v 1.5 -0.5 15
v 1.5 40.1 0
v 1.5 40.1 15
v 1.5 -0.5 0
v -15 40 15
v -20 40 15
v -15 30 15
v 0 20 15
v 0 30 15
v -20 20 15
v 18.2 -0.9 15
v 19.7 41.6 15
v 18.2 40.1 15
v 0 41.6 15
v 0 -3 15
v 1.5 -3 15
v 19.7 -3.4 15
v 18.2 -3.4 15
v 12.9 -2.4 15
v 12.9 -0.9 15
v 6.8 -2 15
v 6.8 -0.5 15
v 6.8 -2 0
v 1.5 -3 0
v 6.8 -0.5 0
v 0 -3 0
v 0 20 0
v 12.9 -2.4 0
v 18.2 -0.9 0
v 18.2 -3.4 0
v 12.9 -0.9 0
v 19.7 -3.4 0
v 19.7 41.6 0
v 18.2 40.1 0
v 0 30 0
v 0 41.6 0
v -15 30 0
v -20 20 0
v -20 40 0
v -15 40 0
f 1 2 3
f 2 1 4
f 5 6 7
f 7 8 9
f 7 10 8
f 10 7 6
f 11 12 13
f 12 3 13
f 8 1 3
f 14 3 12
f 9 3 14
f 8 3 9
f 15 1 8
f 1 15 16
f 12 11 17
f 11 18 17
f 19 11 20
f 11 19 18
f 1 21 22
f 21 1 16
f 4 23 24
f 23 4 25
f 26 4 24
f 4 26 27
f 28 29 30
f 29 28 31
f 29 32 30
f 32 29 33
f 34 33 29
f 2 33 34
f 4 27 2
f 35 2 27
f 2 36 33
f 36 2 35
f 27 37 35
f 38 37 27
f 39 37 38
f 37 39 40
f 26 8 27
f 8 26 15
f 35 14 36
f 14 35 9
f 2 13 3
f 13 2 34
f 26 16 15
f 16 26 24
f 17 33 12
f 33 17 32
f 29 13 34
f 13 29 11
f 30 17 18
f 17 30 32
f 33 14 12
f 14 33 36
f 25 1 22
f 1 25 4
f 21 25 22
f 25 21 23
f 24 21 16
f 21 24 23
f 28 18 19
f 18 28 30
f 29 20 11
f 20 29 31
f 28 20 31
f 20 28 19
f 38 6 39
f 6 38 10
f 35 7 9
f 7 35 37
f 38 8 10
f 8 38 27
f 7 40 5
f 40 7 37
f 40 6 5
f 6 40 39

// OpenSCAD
//CUSTOMIZER VARIABLES
//	Length of the hook
hooklength=20;
// Width of hook and clamp
height=15;
//CUSTOMIZER VARIABLES END

endthickness=5;
thickness=01.5;
doorheight=38.6;
correction_doorheight_inside=0.4;
door_thickness=16.7;
door_undercut=5.3;


module widerhaken(height=height)
{
    linear_extrude(height = height)
    rotate([0,0,0]) polygon(points=[[0,0],[door_undercut,0],[door_undercut,-thickness],[0,-1-thickness]], paths=[[0,1,2,3]],convexity=10);
}


module haken(height=height,hooklength=hooklength)
{translate([0,-2*thickness,0]) cube([thickness,doorheight+3*thickness,height]);
translate([door_thickness+thickness,-2*thickness-correction_doorheight_inside,0]) cube([thickness,doorheight+3*thickness+correction_doorheight_inside,height]);
translate([0,doorheight+thickness,0]) cube([door_thickness+2*thickness,thickness,height]);
    translate([thickness,1-thickness,0]) widerhaken(height);
    translate([door_thickness+thickness,-thickness+1-correction_doorheight_inside,height]) rotate([0,180,0]) widerhaken(height);
    translate([-hooklength,20,0]) cube([hooklength,10,height]);
    translate([-hooklength,20,0]) cube([endthickness,20,height]);
}

haken();
